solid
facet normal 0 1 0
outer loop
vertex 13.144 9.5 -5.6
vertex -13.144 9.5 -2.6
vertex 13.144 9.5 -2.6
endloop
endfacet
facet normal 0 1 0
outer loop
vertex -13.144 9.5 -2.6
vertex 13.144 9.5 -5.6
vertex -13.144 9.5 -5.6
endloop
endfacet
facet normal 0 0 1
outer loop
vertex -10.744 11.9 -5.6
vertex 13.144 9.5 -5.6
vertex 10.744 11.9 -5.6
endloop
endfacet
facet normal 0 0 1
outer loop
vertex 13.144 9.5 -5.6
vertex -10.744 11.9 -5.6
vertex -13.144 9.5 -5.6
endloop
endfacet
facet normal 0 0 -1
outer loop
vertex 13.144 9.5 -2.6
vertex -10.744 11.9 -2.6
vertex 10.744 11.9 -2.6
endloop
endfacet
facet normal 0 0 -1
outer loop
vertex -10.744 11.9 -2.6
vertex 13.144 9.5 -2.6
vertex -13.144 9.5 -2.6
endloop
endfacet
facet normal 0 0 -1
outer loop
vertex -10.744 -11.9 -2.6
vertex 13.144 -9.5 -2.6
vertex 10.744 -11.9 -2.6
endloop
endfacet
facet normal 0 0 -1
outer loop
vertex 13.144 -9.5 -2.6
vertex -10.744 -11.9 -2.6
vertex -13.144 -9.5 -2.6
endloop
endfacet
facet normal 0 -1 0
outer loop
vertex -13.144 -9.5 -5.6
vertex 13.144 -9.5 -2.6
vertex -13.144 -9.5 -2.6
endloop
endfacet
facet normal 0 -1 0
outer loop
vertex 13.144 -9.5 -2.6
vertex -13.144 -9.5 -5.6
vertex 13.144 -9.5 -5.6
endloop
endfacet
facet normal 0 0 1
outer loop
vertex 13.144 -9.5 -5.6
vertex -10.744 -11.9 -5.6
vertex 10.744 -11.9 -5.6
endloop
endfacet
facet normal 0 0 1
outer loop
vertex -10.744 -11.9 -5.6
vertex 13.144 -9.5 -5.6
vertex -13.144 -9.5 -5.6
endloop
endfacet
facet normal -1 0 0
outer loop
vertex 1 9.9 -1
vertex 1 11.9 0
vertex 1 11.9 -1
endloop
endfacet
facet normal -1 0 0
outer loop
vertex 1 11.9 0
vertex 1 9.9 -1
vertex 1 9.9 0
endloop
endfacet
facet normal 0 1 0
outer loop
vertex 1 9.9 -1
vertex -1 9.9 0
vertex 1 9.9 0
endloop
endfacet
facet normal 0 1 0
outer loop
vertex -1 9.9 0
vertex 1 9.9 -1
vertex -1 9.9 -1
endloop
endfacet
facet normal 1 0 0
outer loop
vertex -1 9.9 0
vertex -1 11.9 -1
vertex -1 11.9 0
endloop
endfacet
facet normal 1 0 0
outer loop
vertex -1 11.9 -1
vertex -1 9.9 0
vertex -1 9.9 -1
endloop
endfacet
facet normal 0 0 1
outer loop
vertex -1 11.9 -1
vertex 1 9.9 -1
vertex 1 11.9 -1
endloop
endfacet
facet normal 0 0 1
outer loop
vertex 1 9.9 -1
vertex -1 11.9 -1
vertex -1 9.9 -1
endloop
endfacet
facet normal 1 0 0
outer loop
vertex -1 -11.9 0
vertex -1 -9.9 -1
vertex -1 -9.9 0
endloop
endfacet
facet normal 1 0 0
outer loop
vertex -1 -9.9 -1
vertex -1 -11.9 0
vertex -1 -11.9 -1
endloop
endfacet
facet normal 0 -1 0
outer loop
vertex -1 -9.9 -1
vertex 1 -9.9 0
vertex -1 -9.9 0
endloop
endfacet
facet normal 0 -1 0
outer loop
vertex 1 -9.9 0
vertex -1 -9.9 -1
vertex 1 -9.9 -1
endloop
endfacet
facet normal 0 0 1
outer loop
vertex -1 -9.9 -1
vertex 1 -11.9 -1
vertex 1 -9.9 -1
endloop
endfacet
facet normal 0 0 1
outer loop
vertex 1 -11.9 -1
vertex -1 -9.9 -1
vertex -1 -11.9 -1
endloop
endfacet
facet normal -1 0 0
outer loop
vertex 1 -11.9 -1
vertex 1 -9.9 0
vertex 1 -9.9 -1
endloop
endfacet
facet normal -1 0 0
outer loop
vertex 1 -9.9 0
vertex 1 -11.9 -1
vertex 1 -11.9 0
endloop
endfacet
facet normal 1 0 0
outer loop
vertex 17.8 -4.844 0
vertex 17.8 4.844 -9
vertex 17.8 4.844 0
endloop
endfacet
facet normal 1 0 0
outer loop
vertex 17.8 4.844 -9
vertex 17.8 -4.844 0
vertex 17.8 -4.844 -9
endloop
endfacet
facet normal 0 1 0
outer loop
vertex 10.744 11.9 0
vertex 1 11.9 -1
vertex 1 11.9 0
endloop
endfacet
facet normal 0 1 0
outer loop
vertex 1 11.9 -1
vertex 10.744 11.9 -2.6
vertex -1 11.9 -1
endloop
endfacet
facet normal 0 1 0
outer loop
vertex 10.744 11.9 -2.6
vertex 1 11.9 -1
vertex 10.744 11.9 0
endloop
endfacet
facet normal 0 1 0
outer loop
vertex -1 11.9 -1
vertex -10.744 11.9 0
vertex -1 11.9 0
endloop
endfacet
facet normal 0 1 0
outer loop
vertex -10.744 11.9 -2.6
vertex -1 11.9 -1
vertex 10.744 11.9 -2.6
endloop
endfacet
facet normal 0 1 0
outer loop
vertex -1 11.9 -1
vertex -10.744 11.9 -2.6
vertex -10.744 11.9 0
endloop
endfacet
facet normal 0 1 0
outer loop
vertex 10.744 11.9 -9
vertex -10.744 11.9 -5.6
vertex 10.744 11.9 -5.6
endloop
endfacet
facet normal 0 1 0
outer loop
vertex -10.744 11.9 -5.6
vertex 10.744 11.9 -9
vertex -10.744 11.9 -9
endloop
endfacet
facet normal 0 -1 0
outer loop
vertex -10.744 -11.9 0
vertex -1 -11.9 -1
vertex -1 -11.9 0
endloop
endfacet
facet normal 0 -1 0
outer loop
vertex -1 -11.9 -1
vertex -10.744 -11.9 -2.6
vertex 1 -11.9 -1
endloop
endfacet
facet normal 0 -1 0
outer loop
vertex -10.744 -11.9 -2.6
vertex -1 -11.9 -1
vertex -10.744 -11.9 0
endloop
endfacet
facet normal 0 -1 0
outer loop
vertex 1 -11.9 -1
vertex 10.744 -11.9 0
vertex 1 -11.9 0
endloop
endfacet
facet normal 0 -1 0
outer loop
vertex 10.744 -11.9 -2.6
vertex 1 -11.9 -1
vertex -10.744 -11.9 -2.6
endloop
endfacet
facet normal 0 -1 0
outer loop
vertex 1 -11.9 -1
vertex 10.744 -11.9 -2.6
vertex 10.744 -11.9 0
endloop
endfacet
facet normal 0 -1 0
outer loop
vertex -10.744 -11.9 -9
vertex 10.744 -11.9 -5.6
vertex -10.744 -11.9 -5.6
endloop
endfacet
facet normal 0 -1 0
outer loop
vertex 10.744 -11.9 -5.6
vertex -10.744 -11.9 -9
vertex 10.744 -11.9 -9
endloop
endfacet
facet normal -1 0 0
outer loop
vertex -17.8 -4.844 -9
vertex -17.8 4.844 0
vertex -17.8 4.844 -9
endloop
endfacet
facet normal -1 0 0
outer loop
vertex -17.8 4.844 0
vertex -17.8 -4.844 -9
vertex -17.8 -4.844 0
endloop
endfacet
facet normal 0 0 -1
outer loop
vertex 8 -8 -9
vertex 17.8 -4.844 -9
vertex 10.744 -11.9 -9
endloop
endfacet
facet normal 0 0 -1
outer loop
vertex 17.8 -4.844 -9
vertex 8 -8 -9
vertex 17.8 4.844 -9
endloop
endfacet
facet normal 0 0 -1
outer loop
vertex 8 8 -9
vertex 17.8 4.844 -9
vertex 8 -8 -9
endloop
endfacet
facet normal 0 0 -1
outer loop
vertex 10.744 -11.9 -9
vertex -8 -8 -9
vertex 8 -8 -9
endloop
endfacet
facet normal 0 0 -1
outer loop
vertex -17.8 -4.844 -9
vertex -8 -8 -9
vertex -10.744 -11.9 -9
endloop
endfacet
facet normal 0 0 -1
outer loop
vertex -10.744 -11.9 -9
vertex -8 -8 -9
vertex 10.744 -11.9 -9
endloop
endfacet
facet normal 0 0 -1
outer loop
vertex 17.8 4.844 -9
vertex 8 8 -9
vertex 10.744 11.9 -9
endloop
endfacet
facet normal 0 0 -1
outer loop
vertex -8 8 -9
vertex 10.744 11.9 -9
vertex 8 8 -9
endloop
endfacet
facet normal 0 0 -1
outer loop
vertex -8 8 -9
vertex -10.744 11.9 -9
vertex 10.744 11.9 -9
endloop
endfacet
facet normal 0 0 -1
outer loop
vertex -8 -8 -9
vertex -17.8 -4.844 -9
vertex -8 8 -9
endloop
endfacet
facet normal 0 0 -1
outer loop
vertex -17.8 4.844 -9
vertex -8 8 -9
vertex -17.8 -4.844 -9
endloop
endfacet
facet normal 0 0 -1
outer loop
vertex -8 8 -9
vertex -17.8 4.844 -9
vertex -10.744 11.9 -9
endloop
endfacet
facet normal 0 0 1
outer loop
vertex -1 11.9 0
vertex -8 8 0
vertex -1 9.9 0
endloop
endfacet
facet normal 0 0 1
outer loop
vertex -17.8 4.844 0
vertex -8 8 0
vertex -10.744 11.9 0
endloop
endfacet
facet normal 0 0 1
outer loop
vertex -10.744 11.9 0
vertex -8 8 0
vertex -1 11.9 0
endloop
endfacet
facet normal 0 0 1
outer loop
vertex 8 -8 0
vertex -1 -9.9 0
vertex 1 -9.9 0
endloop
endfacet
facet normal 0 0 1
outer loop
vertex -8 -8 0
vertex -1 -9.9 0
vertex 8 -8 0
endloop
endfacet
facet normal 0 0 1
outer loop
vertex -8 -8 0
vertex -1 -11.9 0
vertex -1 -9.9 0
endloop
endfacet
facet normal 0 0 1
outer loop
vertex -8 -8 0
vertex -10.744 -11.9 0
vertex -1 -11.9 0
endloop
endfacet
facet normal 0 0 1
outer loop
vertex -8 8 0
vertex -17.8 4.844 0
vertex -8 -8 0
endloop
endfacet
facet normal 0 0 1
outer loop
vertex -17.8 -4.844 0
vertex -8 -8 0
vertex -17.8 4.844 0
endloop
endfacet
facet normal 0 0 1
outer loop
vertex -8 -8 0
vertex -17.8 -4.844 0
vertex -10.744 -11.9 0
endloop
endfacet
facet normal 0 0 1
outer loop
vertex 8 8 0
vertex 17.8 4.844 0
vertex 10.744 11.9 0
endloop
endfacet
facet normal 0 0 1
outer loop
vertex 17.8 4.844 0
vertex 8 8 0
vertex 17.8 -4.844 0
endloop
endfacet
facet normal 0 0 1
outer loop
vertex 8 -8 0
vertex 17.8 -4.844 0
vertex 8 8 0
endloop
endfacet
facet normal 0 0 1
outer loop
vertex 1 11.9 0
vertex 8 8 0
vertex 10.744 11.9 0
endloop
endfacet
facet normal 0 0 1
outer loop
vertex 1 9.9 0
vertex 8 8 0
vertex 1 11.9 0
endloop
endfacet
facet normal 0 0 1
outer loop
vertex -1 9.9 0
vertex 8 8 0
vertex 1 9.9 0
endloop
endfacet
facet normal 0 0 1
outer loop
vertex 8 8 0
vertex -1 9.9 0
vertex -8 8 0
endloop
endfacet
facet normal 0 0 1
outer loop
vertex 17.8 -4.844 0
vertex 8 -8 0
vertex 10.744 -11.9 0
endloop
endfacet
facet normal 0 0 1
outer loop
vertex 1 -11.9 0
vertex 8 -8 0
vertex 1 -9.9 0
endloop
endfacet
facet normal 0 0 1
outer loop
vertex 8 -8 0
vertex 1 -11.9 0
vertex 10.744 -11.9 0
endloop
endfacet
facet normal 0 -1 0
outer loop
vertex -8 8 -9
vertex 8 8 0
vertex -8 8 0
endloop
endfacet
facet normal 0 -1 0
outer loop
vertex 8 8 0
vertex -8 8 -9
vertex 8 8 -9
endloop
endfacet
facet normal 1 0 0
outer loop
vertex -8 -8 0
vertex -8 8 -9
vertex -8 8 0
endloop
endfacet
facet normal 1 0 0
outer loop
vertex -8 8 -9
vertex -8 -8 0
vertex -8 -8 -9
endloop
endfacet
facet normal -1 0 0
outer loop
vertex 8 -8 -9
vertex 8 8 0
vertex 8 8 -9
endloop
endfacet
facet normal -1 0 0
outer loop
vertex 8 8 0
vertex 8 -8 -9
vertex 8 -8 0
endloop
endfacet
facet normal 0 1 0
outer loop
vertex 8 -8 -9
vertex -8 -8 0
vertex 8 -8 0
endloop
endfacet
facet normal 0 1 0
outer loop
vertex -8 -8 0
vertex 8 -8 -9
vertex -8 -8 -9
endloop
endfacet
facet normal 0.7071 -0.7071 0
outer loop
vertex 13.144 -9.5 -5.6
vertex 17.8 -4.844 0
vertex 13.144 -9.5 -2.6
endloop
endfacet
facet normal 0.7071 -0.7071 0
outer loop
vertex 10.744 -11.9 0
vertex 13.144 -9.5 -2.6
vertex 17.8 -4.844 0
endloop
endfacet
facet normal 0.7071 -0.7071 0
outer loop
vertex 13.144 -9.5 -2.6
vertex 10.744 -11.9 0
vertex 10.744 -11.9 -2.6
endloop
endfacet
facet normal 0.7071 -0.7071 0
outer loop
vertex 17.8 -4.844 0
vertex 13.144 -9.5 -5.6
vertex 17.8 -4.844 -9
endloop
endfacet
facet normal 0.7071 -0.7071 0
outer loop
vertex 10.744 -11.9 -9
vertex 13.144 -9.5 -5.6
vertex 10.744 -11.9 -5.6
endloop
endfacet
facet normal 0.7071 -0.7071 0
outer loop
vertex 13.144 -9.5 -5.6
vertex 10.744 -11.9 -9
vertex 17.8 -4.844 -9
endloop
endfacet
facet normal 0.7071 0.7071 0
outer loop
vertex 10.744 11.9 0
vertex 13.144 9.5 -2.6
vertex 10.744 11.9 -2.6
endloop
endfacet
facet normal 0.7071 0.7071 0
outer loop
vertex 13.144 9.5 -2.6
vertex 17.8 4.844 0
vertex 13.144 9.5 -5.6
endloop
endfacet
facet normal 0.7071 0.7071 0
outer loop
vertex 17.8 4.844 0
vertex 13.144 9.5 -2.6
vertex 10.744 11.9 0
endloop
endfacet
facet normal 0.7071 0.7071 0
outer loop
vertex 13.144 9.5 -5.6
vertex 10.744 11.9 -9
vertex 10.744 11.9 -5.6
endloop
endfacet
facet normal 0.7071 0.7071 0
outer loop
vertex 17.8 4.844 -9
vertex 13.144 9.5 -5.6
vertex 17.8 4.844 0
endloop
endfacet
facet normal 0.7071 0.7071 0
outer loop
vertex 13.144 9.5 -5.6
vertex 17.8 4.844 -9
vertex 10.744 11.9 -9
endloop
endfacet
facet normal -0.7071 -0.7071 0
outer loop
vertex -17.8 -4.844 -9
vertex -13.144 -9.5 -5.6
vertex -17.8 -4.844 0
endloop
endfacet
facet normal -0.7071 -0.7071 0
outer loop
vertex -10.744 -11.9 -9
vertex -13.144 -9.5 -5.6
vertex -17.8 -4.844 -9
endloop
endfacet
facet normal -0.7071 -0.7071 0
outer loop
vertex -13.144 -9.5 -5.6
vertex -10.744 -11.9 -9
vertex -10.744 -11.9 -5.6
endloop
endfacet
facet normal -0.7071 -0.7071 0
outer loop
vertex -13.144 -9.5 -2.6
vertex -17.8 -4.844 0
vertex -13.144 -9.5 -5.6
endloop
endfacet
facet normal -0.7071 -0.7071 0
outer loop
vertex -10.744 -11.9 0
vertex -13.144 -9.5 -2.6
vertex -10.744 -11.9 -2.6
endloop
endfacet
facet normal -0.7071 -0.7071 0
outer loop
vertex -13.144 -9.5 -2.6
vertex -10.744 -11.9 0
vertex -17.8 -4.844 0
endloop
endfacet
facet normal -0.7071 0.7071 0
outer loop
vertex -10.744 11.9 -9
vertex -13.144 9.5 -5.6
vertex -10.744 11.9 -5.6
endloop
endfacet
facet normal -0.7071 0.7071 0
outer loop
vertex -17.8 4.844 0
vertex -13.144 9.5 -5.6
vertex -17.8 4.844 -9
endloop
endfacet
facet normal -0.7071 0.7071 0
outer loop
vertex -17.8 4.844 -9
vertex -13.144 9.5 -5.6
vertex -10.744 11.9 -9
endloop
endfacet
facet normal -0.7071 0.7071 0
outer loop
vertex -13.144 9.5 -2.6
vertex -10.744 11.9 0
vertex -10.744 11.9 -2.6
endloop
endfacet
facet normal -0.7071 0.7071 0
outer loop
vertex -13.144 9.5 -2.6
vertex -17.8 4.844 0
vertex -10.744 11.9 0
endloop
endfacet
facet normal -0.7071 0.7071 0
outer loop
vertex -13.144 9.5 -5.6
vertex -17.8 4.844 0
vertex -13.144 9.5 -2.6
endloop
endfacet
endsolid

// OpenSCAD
// file: syms.scad
module symY(t) {
    translate(t)
        children();
    mirror([0,1,0])
        translate(t)
            children();
}
module symX(t) {
    translate(t)
        children();
    mirror([1,0,0])
        translate(t)
            children();
}

module symZ(t) {
    translate(t)
        children();
    mirror([0,0,1])
        translate(t)
            children();
}

module	symXY(t) {
	tx=t[0];
	ty=t[1];
	tz=t[2];
	symX([tx,0,0])
	symY([0,ty,tz])
		children();
}
// main file
H2=23.8;
H1=19.0;
W=35.6;
PORT_SIZE=18;
E=0.2;
D1=2.8-E;
D2=5.2-D1+2*E;

D3=11.3-2.3;

use <syms.scad>

function pyth(a,b)=sqrt(a*a+b*b);

module base() {
    rotate(-90,[1,0,0])
    intersection(){
        difference() {
            translate([0,D3/2,0])
            cube([W,D3,H2],center=true);
            
            symZ([0,D1+D2/2,H2/2]){
                cube([100,D2,(H2-H1)],center=true);
            }
            symZ([0,0,H2/2]){
                cube([2,2,4],center=true);
            }
            translate([0,D3/2,0])
            rotate(90,[1,0,0])
            children();
        }
        rotate(45,[0,1,0])
        cube(pyth(W,H2)-(H2-H1)-6,center=true);
    }

}


base()
linear_extrude(height=PORT_SIZE,twist=0,slices=50,center=true)
square(PORT_SIZE-2,center=true);
